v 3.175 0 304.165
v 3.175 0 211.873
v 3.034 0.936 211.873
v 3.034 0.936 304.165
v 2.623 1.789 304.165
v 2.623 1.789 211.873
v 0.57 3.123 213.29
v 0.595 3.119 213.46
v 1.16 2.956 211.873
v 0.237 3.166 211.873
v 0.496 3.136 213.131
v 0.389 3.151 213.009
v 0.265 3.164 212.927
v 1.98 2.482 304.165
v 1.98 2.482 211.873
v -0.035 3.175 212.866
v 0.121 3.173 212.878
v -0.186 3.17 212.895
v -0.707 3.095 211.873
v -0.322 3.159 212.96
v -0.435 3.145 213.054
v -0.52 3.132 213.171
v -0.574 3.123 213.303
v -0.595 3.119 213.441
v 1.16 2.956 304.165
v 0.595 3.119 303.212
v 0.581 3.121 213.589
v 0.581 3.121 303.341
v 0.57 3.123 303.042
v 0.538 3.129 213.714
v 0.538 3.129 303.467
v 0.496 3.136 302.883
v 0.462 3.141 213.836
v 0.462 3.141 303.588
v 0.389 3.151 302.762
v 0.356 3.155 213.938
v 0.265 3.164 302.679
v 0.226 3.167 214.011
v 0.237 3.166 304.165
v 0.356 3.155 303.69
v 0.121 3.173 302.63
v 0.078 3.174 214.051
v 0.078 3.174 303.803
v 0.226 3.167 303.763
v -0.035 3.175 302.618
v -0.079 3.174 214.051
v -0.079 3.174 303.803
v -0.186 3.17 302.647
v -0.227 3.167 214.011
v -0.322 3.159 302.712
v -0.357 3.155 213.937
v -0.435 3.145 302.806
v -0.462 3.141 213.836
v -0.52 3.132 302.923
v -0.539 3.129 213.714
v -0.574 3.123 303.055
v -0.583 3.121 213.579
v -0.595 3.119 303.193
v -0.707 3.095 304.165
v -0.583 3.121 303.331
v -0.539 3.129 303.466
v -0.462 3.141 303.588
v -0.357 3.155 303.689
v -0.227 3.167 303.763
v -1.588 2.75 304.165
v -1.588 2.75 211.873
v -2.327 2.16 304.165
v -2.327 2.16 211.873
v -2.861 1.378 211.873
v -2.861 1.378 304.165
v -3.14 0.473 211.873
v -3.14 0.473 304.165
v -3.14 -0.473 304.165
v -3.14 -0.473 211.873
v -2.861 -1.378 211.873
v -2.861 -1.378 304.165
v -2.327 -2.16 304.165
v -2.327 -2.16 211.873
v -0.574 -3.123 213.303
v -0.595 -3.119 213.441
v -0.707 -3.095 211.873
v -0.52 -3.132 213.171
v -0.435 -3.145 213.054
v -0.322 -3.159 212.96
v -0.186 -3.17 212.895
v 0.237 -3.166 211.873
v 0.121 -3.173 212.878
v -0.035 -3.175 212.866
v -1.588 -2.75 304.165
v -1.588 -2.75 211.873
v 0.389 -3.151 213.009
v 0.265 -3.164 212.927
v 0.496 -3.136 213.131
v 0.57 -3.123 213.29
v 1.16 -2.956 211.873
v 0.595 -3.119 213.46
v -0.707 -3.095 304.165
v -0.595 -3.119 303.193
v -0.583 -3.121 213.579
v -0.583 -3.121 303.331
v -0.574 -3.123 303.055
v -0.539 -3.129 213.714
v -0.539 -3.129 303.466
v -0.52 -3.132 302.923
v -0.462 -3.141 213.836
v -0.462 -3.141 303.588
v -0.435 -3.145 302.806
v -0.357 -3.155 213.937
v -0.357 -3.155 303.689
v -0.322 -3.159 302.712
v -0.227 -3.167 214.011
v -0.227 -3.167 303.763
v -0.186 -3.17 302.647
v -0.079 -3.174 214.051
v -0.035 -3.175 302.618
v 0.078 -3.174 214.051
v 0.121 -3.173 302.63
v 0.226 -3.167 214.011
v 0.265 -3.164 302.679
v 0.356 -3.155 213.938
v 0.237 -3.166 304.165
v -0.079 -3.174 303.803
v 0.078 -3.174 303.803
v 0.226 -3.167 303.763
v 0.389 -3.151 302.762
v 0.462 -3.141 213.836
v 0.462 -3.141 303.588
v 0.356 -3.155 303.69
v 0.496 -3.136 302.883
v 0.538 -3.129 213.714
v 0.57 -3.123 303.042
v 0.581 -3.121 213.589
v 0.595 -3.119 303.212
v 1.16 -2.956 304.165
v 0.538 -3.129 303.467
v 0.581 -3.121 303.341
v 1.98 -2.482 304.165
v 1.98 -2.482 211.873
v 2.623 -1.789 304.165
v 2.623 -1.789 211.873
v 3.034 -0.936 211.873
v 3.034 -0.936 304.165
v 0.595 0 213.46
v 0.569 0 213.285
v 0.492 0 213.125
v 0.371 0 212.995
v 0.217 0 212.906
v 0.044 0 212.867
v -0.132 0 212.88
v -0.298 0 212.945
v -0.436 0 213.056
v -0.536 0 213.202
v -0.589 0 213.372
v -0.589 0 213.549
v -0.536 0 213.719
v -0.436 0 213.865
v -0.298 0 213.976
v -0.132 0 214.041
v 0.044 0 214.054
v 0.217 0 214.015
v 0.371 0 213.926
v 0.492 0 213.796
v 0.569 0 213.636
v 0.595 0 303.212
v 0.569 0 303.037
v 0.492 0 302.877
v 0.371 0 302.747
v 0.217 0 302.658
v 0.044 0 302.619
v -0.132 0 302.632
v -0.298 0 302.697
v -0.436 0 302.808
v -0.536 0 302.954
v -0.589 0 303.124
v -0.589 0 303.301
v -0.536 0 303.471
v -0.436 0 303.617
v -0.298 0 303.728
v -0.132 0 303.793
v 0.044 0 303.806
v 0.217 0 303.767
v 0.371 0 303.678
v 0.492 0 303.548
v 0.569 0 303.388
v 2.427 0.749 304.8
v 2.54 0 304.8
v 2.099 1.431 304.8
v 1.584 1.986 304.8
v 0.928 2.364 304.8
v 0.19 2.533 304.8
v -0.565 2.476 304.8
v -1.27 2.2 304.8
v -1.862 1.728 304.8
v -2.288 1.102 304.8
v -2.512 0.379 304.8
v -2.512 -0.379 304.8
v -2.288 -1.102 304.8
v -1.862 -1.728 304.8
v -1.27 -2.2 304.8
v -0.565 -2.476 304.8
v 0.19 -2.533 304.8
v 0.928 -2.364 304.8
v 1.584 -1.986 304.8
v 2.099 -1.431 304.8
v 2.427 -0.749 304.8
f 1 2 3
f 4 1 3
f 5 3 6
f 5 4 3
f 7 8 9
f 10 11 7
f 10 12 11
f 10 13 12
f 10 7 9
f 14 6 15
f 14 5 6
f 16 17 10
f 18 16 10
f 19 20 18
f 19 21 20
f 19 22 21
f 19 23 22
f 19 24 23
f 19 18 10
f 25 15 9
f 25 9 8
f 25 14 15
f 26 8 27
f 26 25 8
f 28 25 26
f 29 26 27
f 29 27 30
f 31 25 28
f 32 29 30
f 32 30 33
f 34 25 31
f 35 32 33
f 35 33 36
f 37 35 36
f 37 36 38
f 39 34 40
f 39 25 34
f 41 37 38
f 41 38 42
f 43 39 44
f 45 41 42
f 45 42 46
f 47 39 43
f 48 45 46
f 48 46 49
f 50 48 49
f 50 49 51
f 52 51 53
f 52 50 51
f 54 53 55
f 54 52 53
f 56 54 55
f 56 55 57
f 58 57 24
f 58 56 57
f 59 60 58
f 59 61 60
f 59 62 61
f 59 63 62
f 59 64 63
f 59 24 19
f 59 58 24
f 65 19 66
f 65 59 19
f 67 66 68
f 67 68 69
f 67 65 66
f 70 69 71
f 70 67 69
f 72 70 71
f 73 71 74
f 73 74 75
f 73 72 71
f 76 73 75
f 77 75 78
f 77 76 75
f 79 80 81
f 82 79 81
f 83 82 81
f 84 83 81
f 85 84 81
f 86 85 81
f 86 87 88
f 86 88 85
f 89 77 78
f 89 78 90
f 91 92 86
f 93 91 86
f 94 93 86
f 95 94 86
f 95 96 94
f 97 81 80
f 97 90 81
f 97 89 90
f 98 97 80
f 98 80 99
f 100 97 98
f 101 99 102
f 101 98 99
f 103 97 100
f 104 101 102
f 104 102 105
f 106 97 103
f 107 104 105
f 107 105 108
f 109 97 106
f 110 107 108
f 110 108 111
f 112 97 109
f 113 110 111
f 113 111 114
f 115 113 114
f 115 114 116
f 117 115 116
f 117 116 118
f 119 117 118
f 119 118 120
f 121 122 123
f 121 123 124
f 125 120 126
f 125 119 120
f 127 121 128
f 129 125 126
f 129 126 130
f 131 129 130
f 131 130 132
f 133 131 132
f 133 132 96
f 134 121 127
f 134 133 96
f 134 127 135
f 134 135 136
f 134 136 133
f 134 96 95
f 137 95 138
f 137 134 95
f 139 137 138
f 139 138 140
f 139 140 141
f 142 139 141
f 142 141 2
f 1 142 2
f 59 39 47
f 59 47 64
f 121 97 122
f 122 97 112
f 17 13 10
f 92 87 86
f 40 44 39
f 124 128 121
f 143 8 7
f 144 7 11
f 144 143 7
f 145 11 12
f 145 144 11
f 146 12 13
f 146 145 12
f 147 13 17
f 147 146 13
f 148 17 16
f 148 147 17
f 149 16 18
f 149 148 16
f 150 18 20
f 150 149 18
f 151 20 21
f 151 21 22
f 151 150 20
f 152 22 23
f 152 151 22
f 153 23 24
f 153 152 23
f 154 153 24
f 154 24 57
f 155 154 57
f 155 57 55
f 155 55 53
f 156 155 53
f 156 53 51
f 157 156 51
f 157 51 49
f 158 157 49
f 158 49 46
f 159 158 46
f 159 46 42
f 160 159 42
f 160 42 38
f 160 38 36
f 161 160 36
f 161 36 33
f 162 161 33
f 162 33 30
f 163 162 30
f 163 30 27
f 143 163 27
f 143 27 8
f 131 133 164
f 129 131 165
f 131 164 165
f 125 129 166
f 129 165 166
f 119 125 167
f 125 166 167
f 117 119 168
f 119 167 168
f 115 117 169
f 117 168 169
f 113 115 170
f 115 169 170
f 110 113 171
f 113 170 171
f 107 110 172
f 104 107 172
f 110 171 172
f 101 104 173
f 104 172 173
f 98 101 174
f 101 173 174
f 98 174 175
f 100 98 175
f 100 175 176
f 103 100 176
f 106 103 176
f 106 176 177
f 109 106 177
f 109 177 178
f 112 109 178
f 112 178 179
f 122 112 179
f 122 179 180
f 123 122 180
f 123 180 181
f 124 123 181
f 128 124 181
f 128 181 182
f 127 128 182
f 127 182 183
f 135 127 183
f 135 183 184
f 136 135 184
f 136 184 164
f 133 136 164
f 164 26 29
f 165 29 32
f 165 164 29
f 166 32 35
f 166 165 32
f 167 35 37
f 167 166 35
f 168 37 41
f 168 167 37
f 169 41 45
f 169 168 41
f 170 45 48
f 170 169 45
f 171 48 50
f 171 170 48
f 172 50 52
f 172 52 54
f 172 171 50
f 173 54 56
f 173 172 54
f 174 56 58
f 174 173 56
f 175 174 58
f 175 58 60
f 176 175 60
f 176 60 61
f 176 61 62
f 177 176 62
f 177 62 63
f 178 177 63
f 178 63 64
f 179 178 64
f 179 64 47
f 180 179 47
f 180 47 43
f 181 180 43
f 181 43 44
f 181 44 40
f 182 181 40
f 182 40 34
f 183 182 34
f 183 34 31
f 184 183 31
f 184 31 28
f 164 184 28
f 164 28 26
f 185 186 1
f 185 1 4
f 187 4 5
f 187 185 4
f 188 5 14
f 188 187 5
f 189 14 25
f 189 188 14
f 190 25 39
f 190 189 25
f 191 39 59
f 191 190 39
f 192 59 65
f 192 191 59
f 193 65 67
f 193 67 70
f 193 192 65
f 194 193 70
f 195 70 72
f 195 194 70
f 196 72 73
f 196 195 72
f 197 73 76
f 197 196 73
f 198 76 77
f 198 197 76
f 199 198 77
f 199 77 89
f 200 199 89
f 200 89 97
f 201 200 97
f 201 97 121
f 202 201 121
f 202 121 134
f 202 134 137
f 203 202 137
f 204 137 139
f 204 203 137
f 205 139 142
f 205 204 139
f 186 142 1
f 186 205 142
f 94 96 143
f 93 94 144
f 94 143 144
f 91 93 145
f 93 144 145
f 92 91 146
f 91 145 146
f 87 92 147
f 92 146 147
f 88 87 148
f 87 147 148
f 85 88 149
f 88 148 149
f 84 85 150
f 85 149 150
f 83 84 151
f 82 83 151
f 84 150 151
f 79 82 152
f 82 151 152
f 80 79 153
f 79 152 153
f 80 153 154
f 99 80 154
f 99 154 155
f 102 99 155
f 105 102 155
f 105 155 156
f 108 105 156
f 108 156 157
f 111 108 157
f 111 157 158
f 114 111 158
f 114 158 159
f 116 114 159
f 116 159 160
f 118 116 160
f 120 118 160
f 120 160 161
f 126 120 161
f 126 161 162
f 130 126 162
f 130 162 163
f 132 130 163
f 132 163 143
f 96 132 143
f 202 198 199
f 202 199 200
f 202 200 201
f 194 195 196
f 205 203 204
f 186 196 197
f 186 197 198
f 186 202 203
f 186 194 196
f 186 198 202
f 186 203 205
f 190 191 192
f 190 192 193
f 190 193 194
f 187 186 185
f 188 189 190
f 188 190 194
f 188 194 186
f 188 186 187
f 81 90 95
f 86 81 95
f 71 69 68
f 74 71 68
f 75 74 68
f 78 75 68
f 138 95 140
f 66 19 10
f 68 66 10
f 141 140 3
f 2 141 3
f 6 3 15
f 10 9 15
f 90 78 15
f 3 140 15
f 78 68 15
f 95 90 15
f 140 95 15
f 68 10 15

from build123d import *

# Parameters (mm, degrees)
SKETCH3_R               = 3.175
BOSS_EXTRUDE1_DEPTH     = 304.8
CHAMFER1_SIZE           = 0.635
CUT_EXTRUDE1_START      = -92.927050112
SKETCH4_R               = 3.175
CUT_EXTRUDE1_DEPTH      = 517.672949888
SKETCH5_R               = 0.5953125
CUT_EXTRUDE2_DEPTH      = 4.175
CUT_EXTRUDE2_DEPTH_BACK = 4.175


with BuildPart() as part:
    # Sketch3 → Boss-Extrude1 (new body, symmetric)
    with BuildSketch(Plane.XY):
        Circle(SKETCH3_R)
    extrude(amount=BOSS_EXTRUDE1_DEPTH, both=True)

    # Chamfer1
    chamfer1_edges = [part.edges().sort_by_distance(p)[0] for p in [
        (-3.175, 0, -304.8),
        (-3.175, 0, 304.8),
    ]]
    chamfer(chamfer1_edges, length=CHAMFER1_SIZE)

    # Sketch4 → Cut-Extrude1 (cut, through all)
    with BuildSketch(Plane.XY.offset(304.8).offset(CUT_EXTRUDE1_START)):
        Circle(SKETCH4_R)
    extrude(amount=-CUT_EXTRUDE1_DEPTH, mode=Mode.SUBTRACT)

    # Sketch5 → Cut-Extrude2 (cut, two sides)
    with BuildSketch(Plane(origin=(0, 0, 0), x_dir=(1, 0, 0), z_dir=(0, 1, 0))) as cut_extrude2_sk:
        with Locations((0, -213.460449888)):
            Circle(SKETCH5_R)
        with Locations((0, -303.2125)):
            Circle(SKETCH5_R)
    extrude(amount=CUT_EXTRUDE2_DEPTH, mode=Mode.SUBTRACT)
    extrude(cut_extrude2_sk.sketch, amount=-CUT_EXTRUDE2_DEPTH_BACK, mode=Mode.SUBTRACT)


solid = part.part
